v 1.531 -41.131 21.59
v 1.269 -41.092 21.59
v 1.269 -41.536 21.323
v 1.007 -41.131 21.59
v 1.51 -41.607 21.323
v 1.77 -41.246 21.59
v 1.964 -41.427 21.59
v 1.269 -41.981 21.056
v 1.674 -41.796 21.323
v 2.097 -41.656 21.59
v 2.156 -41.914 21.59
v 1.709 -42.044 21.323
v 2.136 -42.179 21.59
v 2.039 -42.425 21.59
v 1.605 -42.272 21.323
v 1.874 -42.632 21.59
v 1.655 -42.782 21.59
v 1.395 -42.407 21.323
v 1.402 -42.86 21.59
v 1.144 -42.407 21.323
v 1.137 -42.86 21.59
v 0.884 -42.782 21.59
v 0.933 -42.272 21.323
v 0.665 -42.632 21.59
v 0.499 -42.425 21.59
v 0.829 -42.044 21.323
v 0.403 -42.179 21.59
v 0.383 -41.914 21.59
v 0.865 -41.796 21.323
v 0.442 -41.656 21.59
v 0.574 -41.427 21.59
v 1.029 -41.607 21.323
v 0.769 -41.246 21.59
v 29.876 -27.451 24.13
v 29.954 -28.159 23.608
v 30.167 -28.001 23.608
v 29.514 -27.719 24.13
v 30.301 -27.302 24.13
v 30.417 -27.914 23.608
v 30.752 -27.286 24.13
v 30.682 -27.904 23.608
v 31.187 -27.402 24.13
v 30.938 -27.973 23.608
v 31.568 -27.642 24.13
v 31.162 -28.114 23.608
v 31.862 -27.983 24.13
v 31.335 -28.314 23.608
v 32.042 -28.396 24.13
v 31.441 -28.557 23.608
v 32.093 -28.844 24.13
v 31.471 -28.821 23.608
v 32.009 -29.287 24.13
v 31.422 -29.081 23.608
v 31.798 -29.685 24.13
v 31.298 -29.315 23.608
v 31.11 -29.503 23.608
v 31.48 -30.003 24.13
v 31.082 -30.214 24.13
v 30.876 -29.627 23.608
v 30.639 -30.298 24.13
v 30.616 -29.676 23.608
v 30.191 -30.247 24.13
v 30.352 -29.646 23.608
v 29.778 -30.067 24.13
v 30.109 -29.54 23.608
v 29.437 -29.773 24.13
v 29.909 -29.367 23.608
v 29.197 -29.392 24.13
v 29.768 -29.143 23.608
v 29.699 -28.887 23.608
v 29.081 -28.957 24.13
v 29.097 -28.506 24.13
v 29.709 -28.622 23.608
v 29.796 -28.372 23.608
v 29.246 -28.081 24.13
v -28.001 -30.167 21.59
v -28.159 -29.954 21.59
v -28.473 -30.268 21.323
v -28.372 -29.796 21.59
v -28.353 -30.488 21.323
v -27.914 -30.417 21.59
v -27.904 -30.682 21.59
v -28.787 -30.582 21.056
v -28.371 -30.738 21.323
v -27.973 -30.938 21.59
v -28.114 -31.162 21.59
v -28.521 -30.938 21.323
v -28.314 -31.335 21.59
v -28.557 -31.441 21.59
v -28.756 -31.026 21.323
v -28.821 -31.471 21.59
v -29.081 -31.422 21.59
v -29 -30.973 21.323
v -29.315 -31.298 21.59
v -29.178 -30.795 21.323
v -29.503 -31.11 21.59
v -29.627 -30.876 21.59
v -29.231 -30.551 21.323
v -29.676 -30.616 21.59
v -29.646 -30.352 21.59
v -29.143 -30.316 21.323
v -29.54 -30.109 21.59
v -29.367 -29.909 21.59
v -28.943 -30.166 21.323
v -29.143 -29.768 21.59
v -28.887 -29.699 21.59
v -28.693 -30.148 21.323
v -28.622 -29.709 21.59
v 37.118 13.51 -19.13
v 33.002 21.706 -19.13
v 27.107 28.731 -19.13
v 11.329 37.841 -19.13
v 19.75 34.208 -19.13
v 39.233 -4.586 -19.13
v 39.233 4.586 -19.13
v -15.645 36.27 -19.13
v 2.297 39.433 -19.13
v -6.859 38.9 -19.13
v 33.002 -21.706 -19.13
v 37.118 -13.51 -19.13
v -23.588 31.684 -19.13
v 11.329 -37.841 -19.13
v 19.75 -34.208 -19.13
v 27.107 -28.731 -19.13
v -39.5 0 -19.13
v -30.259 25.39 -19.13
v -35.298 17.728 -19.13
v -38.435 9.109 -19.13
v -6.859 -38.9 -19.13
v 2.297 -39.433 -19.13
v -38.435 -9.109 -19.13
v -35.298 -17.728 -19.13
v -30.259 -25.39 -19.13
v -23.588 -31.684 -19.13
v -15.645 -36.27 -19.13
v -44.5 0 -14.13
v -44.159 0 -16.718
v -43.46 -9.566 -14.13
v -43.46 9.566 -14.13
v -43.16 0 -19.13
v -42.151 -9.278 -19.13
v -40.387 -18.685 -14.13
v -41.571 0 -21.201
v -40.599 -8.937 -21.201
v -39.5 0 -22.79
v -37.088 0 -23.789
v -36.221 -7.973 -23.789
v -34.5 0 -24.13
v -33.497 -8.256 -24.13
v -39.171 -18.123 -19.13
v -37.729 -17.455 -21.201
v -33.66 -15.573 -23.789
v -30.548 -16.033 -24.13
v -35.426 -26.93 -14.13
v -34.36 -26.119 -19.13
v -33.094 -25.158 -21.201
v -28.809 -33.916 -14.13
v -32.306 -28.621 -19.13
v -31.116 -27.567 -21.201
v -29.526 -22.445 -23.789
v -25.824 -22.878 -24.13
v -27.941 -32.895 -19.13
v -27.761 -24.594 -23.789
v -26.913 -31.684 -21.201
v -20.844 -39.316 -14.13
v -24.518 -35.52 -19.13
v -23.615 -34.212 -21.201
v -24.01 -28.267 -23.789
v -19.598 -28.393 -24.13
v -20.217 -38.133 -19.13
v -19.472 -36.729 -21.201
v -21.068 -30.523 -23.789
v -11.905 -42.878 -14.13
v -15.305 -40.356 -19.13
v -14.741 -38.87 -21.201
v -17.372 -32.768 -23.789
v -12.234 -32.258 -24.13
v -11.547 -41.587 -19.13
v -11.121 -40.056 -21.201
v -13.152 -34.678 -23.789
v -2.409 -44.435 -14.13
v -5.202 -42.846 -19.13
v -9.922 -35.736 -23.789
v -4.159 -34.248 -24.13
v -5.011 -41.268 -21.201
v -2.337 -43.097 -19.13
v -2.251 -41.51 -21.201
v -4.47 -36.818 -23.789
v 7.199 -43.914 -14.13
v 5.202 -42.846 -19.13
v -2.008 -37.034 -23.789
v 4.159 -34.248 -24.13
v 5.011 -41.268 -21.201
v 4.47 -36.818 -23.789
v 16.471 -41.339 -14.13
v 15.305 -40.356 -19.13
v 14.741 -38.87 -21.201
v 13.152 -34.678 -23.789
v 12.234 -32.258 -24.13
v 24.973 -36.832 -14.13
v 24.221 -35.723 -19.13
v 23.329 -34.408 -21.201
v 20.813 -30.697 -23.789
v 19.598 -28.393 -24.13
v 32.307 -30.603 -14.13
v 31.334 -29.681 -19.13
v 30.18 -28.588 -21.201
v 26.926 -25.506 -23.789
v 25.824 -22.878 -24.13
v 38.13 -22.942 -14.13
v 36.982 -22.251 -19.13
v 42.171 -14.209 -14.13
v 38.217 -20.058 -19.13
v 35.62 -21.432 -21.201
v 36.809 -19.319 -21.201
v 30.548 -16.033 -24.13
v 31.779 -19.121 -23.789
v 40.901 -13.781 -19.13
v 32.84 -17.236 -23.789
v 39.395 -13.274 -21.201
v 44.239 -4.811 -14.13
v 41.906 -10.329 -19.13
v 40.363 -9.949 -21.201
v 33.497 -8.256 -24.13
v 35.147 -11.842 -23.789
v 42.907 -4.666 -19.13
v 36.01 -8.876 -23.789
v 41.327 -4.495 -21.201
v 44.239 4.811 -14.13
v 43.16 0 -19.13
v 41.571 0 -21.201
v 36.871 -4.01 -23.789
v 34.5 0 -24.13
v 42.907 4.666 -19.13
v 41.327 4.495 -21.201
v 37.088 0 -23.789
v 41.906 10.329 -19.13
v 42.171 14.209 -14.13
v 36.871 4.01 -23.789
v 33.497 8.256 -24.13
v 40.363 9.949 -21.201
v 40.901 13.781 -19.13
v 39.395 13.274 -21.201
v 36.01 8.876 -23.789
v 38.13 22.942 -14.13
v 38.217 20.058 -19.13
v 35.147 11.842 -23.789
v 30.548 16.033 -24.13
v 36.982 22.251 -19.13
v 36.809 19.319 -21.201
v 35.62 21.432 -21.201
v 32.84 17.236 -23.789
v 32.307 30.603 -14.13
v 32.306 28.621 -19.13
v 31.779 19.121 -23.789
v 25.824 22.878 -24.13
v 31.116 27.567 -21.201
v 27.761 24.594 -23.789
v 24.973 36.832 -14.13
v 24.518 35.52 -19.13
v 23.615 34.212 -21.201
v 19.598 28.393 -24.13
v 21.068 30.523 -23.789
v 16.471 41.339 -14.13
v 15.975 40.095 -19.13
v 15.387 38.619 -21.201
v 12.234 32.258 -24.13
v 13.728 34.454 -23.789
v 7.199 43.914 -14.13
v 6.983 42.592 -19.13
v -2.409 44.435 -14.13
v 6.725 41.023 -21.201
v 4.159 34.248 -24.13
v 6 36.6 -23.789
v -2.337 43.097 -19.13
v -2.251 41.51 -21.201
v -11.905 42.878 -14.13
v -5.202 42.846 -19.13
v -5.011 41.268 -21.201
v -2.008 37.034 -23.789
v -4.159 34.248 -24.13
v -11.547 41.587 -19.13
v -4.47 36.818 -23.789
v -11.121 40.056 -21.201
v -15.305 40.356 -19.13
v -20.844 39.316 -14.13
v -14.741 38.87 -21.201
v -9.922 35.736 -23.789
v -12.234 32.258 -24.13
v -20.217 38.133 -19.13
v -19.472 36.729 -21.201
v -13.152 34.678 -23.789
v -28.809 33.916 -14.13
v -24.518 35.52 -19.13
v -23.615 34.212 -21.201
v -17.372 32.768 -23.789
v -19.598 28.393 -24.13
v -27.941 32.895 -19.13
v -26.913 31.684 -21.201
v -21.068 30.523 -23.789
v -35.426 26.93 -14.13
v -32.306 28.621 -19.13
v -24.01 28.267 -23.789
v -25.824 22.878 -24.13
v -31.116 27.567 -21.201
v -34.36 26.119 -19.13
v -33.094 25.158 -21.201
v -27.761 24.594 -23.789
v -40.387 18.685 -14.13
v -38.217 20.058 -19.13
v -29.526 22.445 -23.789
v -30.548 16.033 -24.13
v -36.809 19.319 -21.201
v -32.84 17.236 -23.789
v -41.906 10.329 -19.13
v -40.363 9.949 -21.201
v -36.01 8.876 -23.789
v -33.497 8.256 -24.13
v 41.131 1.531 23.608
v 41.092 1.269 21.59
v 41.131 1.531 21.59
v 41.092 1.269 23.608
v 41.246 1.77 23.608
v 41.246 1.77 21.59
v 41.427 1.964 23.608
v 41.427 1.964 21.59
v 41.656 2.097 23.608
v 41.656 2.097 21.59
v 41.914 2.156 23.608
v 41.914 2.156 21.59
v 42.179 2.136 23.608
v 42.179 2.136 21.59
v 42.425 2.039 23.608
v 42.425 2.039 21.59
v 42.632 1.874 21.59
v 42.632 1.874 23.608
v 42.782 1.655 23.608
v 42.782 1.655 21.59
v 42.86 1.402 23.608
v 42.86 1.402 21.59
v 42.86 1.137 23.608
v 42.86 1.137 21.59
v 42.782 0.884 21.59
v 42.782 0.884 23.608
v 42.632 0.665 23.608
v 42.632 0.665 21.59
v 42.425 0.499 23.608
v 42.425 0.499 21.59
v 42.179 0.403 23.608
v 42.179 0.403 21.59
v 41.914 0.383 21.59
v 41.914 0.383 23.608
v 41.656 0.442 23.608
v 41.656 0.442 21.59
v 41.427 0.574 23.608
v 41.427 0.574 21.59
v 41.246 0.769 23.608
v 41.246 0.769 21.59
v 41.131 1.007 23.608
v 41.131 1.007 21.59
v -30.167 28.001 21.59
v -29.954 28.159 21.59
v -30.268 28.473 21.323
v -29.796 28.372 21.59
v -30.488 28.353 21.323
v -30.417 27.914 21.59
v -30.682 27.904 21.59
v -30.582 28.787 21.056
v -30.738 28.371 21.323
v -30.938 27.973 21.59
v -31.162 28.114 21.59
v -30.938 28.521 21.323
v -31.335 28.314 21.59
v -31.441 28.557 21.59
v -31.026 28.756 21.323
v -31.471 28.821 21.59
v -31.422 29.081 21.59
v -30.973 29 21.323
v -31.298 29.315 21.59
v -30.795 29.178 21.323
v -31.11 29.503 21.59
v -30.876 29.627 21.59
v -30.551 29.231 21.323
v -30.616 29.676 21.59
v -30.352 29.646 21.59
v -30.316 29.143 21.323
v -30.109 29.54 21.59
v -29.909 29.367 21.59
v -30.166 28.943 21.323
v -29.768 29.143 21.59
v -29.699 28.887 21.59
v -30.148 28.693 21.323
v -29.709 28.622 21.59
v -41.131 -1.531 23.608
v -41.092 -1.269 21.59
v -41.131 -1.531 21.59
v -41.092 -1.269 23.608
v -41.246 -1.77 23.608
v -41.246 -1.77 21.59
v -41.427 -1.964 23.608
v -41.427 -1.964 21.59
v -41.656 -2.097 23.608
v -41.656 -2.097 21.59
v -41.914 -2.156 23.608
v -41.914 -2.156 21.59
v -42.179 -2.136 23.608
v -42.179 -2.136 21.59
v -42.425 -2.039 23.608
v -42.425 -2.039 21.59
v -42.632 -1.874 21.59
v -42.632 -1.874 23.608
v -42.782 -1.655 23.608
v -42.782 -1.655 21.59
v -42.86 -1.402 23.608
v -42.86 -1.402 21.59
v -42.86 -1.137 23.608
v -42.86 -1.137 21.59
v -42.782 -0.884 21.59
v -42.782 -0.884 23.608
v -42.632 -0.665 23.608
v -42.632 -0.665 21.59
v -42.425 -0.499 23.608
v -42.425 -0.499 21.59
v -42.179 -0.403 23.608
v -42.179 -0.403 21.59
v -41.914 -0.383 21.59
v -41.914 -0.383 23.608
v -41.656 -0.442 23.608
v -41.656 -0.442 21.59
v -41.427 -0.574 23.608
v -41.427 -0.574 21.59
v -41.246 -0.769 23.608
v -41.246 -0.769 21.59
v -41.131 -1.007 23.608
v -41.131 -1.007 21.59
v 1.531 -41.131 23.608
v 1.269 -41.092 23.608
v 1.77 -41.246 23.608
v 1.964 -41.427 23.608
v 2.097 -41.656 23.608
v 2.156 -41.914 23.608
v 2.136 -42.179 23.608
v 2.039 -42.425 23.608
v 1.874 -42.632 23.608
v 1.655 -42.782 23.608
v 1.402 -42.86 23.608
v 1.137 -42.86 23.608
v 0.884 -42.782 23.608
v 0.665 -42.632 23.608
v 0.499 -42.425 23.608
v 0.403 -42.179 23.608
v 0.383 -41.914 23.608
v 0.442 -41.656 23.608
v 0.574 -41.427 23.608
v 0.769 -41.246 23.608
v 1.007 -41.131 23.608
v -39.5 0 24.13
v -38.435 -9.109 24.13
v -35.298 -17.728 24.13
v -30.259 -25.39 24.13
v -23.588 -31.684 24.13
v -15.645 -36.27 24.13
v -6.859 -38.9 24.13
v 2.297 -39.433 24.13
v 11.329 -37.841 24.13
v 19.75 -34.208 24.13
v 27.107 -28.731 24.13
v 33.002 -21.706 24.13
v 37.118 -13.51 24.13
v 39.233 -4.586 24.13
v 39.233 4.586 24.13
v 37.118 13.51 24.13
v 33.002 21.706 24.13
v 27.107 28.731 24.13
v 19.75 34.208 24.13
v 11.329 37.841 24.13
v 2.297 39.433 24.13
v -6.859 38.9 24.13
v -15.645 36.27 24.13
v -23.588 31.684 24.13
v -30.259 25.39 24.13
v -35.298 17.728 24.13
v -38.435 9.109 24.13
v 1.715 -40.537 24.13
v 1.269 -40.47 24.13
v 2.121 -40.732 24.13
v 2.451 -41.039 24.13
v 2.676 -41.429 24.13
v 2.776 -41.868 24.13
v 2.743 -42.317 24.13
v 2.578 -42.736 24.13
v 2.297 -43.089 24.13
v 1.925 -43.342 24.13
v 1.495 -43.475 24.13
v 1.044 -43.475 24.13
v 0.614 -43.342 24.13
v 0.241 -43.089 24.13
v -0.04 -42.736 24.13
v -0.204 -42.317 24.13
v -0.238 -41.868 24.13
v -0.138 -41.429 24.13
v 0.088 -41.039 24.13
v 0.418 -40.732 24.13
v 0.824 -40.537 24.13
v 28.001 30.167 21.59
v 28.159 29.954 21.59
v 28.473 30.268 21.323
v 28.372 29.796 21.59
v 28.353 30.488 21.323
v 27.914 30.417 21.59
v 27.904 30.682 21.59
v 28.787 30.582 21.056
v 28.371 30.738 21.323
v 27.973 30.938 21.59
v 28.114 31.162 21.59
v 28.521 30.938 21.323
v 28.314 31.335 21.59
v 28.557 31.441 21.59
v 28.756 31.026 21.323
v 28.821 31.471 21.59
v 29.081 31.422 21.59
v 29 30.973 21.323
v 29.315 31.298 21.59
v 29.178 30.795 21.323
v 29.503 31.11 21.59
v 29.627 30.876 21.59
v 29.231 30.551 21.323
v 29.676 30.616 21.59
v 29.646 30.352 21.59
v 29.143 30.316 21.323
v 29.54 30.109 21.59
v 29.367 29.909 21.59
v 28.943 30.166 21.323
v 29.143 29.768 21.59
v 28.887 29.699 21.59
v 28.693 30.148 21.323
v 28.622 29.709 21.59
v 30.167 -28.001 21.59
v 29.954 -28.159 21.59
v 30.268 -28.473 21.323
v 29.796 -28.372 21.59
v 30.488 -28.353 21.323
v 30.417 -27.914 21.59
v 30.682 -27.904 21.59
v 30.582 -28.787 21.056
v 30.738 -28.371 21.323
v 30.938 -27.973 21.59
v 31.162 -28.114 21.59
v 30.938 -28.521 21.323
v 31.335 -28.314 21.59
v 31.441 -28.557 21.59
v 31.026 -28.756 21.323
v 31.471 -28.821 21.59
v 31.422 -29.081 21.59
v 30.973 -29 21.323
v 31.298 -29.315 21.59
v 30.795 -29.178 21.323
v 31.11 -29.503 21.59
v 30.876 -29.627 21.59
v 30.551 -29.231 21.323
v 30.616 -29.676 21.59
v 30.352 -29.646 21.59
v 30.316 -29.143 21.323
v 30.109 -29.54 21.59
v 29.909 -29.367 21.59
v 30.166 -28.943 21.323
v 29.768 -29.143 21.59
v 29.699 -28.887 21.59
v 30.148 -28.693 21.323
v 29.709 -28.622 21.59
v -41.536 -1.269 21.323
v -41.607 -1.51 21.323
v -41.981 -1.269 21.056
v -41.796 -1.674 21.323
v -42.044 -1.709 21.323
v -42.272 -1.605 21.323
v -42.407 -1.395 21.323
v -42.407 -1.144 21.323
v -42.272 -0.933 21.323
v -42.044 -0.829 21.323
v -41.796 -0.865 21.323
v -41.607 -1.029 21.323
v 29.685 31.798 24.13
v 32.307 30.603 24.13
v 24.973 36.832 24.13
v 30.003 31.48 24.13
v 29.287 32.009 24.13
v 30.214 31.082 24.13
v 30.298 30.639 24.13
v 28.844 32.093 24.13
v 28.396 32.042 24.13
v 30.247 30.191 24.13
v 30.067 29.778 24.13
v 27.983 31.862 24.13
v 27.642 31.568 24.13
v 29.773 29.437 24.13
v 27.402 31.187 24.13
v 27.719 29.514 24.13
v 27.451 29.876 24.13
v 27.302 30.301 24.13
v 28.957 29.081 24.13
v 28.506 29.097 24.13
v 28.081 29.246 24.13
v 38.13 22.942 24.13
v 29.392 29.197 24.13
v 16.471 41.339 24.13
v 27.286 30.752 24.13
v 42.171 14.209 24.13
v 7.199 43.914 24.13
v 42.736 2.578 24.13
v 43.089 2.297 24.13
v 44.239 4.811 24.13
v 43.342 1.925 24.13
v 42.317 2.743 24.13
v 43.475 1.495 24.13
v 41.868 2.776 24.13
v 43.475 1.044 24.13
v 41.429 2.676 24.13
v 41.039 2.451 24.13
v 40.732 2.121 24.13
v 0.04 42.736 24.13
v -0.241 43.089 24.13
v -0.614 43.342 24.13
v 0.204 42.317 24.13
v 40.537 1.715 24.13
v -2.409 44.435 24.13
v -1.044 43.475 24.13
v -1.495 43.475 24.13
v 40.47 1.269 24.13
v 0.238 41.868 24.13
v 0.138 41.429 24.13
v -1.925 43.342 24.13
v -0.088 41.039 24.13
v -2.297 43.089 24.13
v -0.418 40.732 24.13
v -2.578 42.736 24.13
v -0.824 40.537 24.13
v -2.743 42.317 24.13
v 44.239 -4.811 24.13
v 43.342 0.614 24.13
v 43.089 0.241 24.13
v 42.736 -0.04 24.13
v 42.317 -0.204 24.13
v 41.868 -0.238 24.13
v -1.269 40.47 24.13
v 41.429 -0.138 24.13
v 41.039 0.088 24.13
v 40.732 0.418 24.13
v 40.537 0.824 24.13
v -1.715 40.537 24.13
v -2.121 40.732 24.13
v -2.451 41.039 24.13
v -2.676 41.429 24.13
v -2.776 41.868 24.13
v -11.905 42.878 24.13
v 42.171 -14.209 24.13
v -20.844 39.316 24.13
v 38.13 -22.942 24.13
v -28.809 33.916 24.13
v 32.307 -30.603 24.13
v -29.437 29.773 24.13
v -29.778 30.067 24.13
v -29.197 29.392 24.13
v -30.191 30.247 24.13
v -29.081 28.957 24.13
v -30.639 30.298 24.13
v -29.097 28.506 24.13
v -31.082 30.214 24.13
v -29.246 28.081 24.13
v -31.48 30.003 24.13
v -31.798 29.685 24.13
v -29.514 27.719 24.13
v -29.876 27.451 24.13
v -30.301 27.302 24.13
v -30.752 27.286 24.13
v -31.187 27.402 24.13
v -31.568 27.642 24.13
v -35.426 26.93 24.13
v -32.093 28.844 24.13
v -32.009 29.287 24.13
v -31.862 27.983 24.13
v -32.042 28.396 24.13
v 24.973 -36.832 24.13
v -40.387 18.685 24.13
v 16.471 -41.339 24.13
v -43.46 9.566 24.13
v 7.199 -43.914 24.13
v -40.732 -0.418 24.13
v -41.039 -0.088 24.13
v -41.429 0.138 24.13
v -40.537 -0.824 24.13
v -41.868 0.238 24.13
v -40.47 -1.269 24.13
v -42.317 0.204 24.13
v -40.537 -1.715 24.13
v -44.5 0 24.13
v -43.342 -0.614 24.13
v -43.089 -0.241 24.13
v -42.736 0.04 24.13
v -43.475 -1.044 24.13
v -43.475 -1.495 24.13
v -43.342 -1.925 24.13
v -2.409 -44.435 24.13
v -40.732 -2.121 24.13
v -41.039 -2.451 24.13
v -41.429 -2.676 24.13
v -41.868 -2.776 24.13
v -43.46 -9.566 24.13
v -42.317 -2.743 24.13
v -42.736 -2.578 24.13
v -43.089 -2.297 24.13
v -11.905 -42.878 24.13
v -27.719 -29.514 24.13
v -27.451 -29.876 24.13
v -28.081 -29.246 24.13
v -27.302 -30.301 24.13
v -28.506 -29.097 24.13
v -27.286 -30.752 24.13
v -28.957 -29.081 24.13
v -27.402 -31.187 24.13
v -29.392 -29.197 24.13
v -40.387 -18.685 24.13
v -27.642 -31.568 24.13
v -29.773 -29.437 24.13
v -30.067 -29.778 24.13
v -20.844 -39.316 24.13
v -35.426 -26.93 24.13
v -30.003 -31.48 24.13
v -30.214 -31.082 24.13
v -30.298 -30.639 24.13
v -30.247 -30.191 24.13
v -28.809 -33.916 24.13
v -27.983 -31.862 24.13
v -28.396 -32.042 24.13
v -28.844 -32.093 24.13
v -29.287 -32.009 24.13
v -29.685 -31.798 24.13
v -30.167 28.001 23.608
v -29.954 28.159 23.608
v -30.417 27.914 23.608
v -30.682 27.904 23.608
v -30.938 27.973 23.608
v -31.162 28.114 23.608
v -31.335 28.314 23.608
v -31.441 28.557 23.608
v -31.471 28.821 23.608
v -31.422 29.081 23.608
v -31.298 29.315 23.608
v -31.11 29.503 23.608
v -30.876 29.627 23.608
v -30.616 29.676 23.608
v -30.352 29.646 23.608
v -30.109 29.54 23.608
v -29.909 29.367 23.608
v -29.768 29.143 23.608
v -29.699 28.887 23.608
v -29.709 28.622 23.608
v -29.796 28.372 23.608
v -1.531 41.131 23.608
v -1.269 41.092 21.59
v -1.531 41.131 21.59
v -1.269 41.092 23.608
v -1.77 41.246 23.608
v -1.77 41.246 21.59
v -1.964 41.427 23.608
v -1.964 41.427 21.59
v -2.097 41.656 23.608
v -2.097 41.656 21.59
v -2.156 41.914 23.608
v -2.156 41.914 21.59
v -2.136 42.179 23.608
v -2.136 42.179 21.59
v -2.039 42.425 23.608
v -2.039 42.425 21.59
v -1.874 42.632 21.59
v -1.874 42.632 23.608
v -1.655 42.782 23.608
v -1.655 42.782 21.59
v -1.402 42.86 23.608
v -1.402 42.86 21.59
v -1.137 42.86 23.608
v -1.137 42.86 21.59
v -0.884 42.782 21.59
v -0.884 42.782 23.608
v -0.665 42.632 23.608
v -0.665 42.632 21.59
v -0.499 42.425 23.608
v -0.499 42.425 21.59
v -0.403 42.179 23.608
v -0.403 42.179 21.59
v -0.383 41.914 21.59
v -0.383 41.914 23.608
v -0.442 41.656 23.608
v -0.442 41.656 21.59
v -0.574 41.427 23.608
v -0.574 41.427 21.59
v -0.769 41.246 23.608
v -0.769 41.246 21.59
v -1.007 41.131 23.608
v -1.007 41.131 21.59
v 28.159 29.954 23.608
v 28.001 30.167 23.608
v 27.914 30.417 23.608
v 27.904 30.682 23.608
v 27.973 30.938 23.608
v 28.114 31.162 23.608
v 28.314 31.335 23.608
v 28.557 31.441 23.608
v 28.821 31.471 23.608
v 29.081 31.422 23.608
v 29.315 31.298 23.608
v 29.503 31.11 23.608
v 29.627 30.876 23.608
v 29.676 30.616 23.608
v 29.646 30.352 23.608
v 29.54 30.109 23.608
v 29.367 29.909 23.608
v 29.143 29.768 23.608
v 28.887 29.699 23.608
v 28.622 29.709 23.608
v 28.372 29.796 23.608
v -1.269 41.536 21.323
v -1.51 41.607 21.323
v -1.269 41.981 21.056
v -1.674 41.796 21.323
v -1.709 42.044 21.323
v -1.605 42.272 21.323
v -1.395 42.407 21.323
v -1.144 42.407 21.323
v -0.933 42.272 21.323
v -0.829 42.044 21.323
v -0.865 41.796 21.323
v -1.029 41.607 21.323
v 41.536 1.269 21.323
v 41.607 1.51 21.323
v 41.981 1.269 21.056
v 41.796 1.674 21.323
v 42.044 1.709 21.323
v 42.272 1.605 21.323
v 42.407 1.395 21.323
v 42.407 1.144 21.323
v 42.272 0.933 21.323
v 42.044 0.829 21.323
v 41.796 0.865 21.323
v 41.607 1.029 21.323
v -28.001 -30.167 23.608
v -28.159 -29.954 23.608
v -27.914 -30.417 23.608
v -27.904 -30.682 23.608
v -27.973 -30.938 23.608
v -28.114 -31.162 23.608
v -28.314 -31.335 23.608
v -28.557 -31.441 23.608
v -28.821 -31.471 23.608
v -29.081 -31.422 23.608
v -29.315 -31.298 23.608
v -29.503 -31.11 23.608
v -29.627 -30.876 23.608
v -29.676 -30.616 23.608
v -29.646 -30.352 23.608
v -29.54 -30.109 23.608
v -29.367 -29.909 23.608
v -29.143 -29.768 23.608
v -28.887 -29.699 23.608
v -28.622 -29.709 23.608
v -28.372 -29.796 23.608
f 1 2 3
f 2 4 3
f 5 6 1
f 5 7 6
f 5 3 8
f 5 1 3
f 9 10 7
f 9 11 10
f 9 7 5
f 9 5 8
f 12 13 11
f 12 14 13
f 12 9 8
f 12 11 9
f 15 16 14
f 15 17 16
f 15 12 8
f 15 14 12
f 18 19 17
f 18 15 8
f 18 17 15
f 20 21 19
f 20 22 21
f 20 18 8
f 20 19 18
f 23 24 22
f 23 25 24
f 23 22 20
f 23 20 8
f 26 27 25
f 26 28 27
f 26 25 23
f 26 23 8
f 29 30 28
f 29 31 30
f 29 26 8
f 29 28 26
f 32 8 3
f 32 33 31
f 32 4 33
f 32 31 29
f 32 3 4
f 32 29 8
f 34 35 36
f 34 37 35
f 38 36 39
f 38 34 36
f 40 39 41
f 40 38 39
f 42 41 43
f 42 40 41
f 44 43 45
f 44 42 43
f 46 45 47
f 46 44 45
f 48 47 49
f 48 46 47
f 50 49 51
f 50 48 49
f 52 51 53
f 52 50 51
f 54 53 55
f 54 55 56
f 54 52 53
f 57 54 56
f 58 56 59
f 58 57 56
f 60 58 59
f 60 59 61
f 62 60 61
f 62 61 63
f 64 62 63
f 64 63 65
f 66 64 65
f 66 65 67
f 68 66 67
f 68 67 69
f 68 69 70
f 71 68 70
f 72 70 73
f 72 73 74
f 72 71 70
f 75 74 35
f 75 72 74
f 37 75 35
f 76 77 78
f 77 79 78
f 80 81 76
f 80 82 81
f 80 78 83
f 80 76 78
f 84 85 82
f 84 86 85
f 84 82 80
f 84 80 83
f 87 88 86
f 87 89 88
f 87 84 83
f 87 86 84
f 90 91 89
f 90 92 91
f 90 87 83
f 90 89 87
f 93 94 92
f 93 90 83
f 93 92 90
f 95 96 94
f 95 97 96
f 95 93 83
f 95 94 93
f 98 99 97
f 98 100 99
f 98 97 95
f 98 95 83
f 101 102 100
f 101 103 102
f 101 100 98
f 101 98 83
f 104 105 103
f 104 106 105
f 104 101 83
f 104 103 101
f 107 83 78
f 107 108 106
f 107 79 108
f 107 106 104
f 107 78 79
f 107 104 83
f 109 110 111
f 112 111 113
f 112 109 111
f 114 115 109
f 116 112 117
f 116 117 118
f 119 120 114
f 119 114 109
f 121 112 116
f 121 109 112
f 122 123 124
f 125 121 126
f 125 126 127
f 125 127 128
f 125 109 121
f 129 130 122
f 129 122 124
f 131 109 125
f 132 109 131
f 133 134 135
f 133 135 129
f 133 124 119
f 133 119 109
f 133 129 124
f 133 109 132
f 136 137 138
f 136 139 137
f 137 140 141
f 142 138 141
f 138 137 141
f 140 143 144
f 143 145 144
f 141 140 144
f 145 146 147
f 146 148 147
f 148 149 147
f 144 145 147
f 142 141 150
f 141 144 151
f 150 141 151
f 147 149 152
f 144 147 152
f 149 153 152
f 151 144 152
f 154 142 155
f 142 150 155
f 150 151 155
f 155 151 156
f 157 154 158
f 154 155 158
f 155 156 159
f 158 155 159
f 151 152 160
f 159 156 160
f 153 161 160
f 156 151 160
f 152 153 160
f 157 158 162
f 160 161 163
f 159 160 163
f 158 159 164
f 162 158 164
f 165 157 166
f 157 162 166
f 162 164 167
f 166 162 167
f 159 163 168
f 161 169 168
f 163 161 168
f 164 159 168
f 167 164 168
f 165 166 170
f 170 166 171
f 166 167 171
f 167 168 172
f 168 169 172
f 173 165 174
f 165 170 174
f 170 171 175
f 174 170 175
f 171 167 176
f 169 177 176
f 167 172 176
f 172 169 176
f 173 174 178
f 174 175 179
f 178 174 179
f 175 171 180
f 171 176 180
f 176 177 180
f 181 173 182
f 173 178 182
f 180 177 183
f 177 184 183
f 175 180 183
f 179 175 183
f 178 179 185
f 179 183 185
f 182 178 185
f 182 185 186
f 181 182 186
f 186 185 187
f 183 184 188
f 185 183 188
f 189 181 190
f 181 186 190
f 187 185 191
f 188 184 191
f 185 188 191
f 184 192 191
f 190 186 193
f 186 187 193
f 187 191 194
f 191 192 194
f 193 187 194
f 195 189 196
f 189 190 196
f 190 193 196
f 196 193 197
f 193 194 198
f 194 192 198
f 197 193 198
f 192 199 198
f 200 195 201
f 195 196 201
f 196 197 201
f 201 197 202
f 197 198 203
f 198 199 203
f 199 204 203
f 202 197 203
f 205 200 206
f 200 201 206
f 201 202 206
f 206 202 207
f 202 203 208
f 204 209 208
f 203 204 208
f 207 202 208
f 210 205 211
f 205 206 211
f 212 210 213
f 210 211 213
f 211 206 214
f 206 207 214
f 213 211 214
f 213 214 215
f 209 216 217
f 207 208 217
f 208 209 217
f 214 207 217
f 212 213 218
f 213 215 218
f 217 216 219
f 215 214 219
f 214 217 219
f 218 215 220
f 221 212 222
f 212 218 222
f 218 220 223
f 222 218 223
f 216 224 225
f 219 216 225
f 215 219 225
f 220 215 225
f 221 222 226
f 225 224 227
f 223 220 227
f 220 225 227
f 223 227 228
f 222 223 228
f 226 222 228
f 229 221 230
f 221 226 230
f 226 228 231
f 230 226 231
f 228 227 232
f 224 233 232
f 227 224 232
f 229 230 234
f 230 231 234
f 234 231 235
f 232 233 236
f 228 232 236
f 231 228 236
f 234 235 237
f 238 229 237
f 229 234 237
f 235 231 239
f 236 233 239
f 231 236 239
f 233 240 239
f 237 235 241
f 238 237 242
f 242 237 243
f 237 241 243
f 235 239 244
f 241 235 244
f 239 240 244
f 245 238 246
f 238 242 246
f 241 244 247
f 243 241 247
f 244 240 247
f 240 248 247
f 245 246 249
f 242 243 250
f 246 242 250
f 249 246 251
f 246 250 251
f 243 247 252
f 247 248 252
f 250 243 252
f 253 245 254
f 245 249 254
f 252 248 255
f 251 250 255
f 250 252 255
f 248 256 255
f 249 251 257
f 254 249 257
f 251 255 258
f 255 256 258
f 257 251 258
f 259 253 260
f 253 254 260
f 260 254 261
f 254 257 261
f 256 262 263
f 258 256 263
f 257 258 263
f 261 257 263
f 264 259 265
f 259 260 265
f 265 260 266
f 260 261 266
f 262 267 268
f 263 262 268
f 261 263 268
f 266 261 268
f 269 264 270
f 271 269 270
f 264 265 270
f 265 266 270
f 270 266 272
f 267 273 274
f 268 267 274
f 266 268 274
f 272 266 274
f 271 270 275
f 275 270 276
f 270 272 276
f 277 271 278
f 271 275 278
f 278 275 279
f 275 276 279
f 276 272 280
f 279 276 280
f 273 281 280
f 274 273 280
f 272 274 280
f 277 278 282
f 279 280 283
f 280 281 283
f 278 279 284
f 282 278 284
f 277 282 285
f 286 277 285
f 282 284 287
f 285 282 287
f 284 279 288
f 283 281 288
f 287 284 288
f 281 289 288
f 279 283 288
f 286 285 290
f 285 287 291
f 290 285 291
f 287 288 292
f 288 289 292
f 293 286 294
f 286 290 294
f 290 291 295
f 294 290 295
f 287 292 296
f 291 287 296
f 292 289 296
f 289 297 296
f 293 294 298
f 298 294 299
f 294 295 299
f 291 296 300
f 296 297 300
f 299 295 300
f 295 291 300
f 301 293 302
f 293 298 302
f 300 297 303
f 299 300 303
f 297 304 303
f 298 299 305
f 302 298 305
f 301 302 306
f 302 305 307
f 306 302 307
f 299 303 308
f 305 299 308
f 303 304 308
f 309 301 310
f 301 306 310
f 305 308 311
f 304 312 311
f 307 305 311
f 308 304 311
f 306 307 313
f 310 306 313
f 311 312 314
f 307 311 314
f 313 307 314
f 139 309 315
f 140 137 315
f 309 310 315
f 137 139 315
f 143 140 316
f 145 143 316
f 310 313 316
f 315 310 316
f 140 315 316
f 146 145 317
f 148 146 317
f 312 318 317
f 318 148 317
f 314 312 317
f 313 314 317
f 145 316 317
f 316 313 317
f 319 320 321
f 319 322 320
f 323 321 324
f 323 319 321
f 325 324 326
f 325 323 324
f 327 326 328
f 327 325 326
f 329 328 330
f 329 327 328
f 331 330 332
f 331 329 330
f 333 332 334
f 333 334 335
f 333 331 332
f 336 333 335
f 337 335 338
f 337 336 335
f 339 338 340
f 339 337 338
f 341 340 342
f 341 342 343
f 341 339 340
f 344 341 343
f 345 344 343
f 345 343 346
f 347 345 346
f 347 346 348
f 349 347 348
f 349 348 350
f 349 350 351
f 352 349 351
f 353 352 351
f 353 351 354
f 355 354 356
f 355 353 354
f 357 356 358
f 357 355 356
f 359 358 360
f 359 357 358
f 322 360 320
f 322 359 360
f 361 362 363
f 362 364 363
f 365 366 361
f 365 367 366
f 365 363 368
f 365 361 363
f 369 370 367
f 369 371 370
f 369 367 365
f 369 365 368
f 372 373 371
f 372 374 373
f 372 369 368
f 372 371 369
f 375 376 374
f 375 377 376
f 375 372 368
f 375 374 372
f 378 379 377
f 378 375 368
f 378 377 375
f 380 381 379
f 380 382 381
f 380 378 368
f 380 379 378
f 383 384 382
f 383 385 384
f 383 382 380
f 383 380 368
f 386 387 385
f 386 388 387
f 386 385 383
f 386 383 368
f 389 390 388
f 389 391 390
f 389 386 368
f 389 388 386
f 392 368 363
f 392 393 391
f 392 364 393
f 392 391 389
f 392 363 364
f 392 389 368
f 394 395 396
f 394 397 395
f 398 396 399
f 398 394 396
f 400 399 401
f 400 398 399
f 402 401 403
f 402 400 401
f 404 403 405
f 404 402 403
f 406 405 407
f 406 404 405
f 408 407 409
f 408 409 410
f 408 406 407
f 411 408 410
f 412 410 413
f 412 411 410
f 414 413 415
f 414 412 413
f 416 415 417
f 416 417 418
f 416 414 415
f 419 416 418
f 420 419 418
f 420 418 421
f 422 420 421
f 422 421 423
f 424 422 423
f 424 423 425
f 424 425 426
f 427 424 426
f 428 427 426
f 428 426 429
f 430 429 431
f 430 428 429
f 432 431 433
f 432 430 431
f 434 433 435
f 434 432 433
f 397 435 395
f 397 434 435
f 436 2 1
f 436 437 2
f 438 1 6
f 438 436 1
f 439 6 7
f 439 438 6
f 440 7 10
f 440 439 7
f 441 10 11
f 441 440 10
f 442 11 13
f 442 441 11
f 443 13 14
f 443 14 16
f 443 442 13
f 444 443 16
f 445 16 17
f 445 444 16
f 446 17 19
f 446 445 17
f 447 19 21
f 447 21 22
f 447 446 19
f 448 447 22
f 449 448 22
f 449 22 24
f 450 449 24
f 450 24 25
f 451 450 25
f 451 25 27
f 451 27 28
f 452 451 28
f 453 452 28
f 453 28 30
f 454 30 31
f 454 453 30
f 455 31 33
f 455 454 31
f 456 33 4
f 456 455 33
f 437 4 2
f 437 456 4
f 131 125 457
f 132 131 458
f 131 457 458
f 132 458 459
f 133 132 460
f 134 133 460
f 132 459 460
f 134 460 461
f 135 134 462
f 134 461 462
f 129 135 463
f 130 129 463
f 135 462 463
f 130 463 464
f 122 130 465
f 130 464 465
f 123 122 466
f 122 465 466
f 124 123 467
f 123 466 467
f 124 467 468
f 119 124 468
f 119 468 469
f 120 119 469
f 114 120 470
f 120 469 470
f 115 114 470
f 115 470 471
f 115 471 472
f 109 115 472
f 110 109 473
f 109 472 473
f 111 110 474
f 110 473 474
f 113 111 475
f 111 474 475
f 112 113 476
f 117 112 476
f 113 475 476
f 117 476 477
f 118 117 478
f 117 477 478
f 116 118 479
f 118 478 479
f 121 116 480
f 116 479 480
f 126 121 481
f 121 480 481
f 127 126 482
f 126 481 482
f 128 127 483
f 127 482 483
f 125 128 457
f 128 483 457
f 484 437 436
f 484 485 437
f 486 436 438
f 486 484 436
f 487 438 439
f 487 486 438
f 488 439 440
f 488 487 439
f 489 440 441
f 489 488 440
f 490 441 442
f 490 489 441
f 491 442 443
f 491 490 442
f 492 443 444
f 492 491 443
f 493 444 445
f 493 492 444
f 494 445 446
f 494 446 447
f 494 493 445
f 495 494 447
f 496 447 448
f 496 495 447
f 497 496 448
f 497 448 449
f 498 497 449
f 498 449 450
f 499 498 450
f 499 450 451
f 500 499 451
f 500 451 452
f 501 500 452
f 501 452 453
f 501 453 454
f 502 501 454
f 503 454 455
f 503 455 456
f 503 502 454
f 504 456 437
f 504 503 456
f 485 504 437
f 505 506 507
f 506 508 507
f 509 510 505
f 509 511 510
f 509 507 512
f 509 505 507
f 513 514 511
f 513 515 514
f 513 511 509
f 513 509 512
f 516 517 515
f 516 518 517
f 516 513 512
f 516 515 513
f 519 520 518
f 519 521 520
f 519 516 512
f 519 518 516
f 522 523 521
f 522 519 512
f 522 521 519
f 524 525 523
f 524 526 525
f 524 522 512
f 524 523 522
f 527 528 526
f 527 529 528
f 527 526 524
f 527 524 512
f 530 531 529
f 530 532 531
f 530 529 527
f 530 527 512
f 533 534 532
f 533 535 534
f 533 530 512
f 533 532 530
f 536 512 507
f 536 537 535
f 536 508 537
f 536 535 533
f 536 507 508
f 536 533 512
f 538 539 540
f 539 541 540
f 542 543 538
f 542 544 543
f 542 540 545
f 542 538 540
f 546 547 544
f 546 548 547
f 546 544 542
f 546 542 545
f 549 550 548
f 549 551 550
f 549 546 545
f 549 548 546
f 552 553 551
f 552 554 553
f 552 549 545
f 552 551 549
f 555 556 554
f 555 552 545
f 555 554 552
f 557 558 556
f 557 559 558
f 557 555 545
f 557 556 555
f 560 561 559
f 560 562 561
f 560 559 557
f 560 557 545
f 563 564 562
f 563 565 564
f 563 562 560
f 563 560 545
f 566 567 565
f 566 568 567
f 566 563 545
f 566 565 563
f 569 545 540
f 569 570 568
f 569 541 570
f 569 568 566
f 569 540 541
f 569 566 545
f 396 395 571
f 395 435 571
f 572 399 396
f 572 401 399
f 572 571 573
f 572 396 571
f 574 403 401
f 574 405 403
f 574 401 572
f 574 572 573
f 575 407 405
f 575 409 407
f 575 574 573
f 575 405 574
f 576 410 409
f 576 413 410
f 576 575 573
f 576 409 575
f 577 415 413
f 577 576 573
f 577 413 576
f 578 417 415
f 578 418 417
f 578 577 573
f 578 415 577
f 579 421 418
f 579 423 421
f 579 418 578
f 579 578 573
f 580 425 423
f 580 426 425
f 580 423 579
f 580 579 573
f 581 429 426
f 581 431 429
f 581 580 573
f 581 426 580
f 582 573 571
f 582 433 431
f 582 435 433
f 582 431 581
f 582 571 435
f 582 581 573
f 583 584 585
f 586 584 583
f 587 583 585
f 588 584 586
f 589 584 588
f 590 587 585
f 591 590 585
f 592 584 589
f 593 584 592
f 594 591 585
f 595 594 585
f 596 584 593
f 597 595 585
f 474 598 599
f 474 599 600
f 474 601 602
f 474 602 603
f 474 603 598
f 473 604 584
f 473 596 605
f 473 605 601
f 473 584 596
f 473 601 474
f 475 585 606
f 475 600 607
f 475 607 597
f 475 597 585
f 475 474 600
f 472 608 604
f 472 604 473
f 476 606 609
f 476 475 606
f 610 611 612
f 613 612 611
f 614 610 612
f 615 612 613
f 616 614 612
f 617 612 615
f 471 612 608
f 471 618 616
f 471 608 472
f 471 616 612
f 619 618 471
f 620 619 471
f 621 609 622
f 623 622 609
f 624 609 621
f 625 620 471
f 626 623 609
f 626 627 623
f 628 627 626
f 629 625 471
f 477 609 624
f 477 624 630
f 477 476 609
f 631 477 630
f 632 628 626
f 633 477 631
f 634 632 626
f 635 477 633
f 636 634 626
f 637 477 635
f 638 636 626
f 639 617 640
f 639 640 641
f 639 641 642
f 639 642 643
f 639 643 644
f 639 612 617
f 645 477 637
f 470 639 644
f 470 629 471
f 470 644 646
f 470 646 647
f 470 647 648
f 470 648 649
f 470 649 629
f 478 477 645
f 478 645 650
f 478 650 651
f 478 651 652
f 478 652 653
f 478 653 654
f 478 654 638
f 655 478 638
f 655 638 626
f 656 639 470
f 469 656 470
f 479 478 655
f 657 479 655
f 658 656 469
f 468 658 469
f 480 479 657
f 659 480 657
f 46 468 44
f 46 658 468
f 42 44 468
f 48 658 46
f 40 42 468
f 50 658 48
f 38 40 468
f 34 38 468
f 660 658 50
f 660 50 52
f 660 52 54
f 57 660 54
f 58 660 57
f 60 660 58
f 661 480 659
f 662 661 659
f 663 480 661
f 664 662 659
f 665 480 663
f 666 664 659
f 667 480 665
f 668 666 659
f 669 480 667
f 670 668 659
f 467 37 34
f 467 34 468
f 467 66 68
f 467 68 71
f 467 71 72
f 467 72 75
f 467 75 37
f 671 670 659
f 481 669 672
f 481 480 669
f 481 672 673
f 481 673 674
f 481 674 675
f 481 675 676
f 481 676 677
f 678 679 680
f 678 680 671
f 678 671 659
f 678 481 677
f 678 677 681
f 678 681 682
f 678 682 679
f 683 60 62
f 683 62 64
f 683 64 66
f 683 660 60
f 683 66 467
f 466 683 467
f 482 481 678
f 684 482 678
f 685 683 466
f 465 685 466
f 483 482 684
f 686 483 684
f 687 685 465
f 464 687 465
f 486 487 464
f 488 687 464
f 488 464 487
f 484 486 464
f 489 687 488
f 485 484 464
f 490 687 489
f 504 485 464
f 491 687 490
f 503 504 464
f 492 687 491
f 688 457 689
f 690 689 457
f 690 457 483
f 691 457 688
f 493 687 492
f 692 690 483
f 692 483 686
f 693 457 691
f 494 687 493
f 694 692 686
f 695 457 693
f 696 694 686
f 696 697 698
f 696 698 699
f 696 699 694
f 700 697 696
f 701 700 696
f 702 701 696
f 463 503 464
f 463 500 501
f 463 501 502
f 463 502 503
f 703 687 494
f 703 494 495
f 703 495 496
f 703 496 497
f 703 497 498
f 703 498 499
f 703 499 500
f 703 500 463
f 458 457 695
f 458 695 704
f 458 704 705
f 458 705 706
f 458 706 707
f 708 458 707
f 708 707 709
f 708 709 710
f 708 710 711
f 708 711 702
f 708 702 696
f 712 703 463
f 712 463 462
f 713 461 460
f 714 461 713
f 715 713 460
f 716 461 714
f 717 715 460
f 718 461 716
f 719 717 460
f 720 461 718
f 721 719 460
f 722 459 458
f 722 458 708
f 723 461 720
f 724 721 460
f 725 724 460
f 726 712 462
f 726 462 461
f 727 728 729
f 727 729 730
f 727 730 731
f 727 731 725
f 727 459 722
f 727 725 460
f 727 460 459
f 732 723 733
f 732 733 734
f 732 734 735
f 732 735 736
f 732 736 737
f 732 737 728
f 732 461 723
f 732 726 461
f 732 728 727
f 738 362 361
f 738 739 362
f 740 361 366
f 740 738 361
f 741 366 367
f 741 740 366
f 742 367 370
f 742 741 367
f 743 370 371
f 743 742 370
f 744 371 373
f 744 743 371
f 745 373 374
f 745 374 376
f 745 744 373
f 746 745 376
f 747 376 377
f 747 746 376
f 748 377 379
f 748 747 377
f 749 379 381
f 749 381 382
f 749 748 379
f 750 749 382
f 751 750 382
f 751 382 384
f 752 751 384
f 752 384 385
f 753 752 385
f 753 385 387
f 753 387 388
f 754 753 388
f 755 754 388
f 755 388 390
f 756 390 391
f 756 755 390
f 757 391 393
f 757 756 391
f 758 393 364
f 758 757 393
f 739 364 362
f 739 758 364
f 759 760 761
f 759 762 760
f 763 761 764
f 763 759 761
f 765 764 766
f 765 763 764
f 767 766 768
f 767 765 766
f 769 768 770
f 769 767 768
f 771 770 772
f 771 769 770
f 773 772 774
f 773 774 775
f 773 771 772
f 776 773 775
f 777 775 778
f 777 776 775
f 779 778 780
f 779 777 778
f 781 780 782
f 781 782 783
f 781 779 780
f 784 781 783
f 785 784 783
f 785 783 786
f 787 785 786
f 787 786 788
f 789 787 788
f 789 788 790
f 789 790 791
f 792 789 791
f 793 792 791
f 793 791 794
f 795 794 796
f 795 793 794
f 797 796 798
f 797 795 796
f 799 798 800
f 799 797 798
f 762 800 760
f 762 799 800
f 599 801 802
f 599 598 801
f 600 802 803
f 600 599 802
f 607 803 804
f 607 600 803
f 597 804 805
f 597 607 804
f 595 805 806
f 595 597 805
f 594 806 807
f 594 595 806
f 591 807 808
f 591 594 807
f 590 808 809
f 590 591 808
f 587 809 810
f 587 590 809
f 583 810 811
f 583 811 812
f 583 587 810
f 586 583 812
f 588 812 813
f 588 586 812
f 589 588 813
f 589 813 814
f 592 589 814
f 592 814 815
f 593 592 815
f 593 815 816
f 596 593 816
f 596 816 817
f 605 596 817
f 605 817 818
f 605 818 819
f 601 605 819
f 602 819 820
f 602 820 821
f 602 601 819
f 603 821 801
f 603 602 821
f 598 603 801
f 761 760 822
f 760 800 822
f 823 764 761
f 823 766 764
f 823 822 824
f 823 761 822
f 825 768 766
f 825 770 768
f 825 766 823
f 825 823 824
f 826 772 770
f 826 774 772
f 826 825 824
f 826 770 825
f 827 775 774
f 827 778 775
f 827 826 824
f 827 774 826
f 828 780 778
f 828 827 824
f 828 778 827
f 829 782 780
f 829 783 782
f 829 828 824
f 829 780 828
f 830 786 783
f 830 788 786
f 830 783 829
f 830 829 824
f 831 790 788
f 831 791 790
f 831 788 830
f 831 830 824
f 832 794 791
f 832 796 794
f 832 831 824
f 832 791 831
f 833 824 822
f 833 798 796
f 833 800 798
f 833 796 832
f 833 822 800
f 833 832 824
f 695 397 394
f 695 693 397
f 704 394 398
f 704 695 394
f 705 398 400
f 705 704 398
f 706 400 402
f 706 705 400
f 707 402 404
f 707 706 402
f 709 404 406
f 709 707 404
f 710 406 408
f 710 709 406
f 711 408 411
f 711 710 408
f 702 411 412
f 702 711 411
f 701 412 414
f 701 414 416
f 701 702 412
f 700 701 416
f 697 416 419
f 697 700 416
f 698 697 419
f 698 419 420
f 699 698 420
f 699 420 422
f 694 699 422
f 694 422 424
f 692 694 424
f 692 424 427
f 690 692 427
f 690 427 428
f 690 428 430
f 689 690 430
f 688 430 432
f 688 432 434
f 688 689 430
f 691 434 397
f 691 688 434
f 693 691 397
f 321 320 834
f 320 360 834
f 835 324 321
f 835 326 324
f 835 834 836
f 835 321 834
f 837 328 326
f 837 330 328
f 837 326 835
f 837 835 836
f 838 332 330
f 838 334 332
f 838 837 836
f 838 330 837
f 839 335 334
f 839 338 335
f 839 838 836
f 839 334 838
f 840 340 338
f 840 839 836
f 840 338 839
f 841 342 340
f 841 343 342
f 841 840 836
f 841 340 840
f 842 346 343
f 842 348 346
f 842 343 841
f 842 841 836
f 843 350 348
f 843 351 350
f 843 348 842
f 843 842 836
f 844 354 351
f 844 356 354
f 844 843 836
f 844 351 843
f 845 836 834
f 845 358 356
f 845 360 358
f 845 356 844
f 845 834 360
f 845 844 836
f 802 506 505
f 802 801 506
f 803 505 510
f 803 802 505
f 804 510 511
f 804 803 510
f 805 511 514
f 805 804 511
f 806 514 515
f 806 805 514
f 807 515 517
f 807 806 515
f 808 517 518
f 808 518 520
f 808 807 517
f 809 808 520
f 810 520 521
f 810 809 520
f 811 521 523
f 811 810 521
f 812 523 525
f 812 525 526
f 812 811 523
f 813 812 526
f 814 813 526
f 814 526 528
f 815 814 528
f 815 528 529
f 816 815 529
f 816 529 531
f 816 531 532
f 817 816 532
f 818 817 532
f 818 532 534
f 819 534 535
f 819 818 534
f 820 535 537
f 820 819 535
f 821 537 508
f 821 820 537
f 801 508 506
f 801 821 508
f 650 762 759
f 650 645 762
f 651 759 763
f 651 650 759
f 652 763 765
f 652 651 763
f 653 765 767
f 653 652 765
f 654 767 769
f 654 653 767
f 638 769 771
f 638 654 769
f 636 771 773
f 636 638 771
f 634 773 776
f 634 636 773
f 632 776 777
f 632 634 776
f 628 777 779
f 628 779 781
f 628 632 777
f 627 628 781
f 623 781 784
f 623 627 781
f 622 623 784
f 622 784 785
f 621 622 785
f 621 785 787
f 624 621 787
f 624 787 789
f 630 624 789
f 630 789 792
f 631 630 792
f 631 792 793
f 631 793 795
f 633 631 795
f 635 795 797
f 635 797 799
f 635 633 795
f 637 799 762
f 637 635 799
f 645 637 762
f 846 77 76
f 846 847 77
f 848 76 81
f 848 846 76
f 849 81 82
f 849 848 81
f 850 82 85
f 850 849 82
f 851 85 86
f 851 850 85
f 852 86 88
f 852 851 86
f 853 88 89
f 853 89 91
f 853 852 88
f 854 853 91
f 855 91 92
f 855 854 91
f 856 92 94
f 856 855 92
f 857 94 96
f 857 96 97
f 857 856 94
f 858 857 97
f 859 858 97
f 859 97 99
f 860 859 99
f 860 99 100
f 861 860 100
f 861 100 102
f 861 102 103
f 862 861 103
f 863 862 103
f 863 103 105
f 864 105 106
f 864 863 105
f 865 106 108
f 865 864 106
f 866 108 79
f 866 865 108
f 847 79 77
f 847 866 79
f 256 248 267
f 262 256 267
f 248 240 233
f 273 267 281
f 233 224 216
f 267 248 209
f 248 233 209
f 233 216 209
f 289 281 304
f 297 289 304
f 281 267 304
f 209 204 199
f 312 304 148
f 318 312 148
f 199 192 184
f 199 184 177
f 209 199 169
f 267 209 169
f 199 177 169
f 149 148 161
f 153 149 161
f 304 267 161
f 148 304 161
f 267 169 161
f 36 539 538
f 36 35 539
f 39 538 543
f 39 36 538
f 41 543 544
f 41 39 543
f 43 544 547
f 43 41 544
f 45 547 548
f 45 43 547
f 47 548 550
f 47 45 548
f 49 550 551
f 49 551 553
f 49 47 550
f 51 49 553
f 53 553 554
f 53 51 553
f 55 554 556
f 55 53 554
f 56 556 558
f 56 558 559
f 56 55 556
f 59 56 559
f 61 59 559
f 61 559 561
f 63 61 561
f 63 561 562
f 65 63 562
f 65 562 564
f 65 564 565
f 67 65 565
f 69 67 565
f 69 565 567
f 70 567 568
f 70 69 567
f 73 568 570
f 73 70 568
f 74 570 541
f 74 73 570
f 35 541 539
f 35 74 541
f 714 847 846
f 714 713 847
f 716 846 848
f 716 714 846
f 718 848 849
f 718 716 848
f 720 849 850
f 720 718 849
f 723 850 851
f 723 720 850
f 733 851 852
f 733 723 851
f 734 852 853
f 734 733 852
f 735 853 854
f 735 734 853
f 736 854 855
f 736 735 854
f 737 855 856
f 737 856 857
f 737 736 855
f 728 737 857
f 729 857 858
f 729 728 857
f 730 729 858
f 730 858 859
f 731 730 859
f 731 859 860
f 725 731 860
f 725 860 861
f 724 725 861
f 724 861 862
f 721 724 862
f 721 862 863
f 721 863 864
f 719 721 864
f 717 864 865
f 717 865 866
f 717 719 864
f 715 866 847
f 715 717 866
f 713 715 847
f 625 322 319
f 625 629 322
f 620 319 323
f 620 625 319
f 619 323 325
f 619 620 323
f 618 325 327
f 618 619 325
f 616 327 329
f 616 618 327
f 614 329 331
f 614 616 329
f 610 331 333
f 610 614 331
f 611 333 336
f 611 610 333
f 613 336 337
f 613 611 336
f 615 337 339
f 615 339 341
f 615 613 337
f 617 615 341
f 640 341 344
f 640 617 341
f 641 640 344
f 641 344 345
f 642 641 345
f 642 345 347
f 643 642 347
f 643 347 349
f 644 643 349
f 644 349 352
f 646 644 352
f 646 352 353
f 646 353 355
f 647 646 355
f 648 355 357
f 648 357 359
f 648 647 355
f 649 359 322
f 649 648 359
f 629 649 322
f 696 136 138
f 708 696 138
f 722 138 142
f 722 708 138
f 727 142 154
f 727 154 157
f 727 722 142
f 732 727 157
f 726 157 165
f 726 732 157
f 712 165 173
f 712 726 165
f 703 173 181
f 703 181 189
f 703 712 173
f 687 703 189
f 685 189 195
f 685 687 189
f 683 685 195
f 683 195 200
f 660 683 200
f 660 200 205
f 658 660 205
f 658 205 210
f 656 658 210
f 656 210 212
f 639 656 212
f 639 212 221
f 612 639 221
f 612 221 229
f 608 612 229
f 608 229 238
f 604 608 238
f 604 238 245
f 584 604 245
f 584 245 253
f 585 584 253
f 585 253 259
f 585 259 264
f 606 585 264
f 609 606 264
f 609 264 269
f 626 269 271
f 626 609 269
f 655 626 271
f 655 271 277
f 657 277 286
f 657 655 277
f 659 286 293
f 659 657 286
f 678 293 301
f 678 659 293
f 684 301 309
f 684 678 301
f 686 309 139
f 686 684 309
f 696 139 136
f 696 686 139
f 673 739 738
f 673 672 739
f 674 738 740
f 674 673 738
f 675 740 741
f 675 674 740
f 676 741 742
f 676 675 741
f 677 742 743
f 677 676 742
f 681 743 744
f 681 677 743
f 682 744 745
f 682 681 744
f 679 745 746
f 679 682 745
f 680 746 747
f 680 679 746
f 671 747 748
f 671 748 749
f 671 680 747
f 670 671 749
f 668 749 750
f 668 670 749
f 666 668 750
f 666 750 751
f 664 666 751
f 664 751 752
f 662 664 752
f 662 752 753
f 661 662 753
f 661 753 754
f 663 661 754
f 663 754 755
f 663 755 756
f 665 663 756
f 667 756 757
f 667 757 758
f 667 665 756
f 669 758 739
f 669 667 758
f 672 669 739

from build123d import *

# Parameters (mm, degrees)
SKETCH1_R                                 = 44.5
BOSS_EXTRUDE1_DEPTH                       = 24.13
SHELL1_T                                  = -5
CSK_FOR_0_FLAT_HEAD_MACHINE_SCREW_2_COUNT = 2
CSK_FOR_0_FLAT_HEAD_MACHINE_SCREW_2_PITCH = 69.412105808
CIRPATTERN1_COUNT                         = 8
FILLET1_R                                 = 10


with BuildPart() as part:
    # Sketch1 → Boss-Extrude1 (new, symmetric)
    with BuildSketch(Plane.XY):
        with Locations(Location((0, 0, 0), (0, 0, 180))):
            Circle(SKETCH1_R)
    extrude(amount=BOSS_EXTRUDE1_DEPTH, both=True)

    # Shell1
    shell1_openings = [part.faces().sort_by_distance(p)[0] for p in [
        (0, 0, 24.13),
    ]]
    offset(amount=SHELL1_T, openings=shell1_openings, kind=Kind.INTERSECTION)

    # Sketch5 → CSK for #0 Flat Head Machine Screw (100)1 (revolve, cut)
    with BuildSketch(Plane(origin=(-1.269301035, 41.980815558, 24.13), x_dir=(0, -1, 0), z_dir=(1, 0, 0))):
        Polygon((0, 0), (0, 3.07416509), (0.889, 2.54), (0.889, 0.5221717), (1.5113, 0), align=None)
    csk_for_0_flat_head_machine_screw_100 = revolve(axis=Axis((-1.269301035, 41.980815558, 30.48), (0, 0, -1)), mode=Mode.SUBTRACT)

    # CSK for _0 Flat Head Machine Screw _ 2: CSK for #0 Flat Head Machine Screw (100)1 ×2
    with Locations(*[Vector(0.9567328467758284, -0.2909677987341887, 0) * (i * CSK_FOR_0_FLAT_HEAD_MACHINE_SCREW_2_PITCH) for i in range(1, CSK_FOR_0_FLAT_HEAD_MACHINE_SCREW_2_COUNT)]):
        add(csk_for_0_flat_head_machine_screw_100, mode=Mode.SUBTRACT)

    # CirPattern1: CSK for #0 Flat Head Machine Screw (100)1 ×8 about axis
    cirpattern1_axis = Axis((0, 0, 0), (0, 0, 1))
    for i in range(1, CIRPATTERN1_COUNT):
        add(csk_for_0_flat_head_machine_screw_100.rotate(cirpattern1_axis, i * 360 / CIRPATTERN1_COUNT), mode=Mode.SUBTRACT)

    # CirPattern1 copy 1 sketch → CirPattern1 copy 1 (revolve, cut)
    with BuildSketch(Plane(origin=(30.656906272, 61.464315428, 24.13), x_dir=(0.7071067811865475, -0.7071067811865476, 0), z_dir=(0.7071067811865476, 0.7071067811865475, 0))):
        Polygon((0, 0), (0, 3.07416509), (0.889, 2.54), (0.889, 0.5221717), (1.5113, 0), align=None)
    revolve(axis=Axis((30.656906272, 61.464315428, 30.48), (0, 0, -1)), mode=Mode.SUBTRACT)

    # CirPattern1 copy 2 sketch → CirPattern1 copy 2 (revolve, cut)
    with BuildSketch(Plane(origin=(-21.784127925, 65.139540555, 24.13), x_dir=(1, 0, 0), z_dir=(0, 1, 0))):
        Polygon((0, 0), (0, 3.07416509), (0.889, 2.54), (0.889, 0.5221717), (1.5113, 0), align=None)
    revolve(axis=Axis((-21.784127925, 65.139540555, 30.48), (0, 0, -1)), mode=Mode.SUBTRACT)

    # CirPattern1 copy 3 sketch → CirPattern1 copy 3 (revolve, cut)
    with BuildSketch(Plane(origin=(-61.464315428, 30.656906272, 24.13), x_dir=(0.7071067811865476, 0.7071067811865475, 0), z_dir=(-0.7071067811865475, 0.7071067811865476, 0))):
        Polygon((0, 0), (0, 3.07416509), (0.889, 2.54), (0.889, 0.5221717), (1.5113, 0), align=None)
    revolve(axis=Axis((-61.464315428, 30.656906272, 30.48), (0, 0, -1)), mode=Mode.SUBTRACT)

    # CirPattern1 copy 4 sketch → CirPattern1 copy 4 (revolve, cut)
    with BuildSketch(Plane(origin=(-65.139540555, -21.784127925, 24.13), x_dir=(0, 1, 0), z_dir=(-1, 0, 0))):
        Polygon((0, 0), (0, 3.07416509), (0.889, 2.54), (0.889, 0.5221717), (1.5113, 0), align=None)
    revolve(axis=Axis((-65.139540555, -21.784127925, 30.48), (0, 0, -1)), mode=Mode.SUBTRACT)

    # CirPattern1 copy 5 sketch → CirPattern1 copy 5 (revolve, cut)
    with BuildSketch(Plane(origin=(-30.656906272, -61.464315428, 24.13), x_dir=(-0.7071067811865475, 0.7071067811865477, 0), z_dir=(-0.7071067811865477, -0.7071067811865475, 0))):
        Polygon((0, 0), (0, 3.07416509), (0.889, 2.54), (0.889, 0.5221717), (1.5113, 0), align=None)
    revolve(axis=Axis((-30.656906272, -61.464315428, 30.48), (0, 0, -1)), mode=Mode.SUBTRACT)

    # CirPattern1 copy 6 sketch → CirPattern1 copy 6 (revolve, cut)
    with BuildSketch(Plane(origin=(21.784127925, -65.139540555, 24.13), x_dir=(-1, 0, 0), z_dir=(0, -1, 0))):
        Polygon((0, 0), (0, 3.07416509), (0.889, 2.54), (0.889, 0.5221717), (1.5113, 0), align=None)
    revolve(axis=Axis((21.784127925, -65.139540555, 30.48), (0, 0, -1)), mode=Mode.SUBTRACT)

    # CirPattern1 copy 7 sketch → CirPattern1 copy 7 (revolve, cut)
    with BuildSketch(Plane(origin=(61.464315428, -30.656906272, 24.13), x_dir=(-0.7071067811865477, -0.7071067811865474, 0), z_dir=(0.7071067811865474, -0.7071067811865477, 0))):
        Polygon((0, 0), (0, 3.07416509), (0.889, 2.54), (0.889, 0.5221717), (1.5113, 0), align=None)
    revolve(axis=Axis((61.464315428, -30.656906272, 30.48), (0, 0, -1)), mode=Mode.SUBTRACT)

    # Fillet1
    fillet1_edges = [part.edges().sort_by_distance(p)[0] for p in [
        (44.5, 0, -24.13),
    ]]
    fillet(fillet1_edges, radius=FILLET1_R)


solid = part.part
